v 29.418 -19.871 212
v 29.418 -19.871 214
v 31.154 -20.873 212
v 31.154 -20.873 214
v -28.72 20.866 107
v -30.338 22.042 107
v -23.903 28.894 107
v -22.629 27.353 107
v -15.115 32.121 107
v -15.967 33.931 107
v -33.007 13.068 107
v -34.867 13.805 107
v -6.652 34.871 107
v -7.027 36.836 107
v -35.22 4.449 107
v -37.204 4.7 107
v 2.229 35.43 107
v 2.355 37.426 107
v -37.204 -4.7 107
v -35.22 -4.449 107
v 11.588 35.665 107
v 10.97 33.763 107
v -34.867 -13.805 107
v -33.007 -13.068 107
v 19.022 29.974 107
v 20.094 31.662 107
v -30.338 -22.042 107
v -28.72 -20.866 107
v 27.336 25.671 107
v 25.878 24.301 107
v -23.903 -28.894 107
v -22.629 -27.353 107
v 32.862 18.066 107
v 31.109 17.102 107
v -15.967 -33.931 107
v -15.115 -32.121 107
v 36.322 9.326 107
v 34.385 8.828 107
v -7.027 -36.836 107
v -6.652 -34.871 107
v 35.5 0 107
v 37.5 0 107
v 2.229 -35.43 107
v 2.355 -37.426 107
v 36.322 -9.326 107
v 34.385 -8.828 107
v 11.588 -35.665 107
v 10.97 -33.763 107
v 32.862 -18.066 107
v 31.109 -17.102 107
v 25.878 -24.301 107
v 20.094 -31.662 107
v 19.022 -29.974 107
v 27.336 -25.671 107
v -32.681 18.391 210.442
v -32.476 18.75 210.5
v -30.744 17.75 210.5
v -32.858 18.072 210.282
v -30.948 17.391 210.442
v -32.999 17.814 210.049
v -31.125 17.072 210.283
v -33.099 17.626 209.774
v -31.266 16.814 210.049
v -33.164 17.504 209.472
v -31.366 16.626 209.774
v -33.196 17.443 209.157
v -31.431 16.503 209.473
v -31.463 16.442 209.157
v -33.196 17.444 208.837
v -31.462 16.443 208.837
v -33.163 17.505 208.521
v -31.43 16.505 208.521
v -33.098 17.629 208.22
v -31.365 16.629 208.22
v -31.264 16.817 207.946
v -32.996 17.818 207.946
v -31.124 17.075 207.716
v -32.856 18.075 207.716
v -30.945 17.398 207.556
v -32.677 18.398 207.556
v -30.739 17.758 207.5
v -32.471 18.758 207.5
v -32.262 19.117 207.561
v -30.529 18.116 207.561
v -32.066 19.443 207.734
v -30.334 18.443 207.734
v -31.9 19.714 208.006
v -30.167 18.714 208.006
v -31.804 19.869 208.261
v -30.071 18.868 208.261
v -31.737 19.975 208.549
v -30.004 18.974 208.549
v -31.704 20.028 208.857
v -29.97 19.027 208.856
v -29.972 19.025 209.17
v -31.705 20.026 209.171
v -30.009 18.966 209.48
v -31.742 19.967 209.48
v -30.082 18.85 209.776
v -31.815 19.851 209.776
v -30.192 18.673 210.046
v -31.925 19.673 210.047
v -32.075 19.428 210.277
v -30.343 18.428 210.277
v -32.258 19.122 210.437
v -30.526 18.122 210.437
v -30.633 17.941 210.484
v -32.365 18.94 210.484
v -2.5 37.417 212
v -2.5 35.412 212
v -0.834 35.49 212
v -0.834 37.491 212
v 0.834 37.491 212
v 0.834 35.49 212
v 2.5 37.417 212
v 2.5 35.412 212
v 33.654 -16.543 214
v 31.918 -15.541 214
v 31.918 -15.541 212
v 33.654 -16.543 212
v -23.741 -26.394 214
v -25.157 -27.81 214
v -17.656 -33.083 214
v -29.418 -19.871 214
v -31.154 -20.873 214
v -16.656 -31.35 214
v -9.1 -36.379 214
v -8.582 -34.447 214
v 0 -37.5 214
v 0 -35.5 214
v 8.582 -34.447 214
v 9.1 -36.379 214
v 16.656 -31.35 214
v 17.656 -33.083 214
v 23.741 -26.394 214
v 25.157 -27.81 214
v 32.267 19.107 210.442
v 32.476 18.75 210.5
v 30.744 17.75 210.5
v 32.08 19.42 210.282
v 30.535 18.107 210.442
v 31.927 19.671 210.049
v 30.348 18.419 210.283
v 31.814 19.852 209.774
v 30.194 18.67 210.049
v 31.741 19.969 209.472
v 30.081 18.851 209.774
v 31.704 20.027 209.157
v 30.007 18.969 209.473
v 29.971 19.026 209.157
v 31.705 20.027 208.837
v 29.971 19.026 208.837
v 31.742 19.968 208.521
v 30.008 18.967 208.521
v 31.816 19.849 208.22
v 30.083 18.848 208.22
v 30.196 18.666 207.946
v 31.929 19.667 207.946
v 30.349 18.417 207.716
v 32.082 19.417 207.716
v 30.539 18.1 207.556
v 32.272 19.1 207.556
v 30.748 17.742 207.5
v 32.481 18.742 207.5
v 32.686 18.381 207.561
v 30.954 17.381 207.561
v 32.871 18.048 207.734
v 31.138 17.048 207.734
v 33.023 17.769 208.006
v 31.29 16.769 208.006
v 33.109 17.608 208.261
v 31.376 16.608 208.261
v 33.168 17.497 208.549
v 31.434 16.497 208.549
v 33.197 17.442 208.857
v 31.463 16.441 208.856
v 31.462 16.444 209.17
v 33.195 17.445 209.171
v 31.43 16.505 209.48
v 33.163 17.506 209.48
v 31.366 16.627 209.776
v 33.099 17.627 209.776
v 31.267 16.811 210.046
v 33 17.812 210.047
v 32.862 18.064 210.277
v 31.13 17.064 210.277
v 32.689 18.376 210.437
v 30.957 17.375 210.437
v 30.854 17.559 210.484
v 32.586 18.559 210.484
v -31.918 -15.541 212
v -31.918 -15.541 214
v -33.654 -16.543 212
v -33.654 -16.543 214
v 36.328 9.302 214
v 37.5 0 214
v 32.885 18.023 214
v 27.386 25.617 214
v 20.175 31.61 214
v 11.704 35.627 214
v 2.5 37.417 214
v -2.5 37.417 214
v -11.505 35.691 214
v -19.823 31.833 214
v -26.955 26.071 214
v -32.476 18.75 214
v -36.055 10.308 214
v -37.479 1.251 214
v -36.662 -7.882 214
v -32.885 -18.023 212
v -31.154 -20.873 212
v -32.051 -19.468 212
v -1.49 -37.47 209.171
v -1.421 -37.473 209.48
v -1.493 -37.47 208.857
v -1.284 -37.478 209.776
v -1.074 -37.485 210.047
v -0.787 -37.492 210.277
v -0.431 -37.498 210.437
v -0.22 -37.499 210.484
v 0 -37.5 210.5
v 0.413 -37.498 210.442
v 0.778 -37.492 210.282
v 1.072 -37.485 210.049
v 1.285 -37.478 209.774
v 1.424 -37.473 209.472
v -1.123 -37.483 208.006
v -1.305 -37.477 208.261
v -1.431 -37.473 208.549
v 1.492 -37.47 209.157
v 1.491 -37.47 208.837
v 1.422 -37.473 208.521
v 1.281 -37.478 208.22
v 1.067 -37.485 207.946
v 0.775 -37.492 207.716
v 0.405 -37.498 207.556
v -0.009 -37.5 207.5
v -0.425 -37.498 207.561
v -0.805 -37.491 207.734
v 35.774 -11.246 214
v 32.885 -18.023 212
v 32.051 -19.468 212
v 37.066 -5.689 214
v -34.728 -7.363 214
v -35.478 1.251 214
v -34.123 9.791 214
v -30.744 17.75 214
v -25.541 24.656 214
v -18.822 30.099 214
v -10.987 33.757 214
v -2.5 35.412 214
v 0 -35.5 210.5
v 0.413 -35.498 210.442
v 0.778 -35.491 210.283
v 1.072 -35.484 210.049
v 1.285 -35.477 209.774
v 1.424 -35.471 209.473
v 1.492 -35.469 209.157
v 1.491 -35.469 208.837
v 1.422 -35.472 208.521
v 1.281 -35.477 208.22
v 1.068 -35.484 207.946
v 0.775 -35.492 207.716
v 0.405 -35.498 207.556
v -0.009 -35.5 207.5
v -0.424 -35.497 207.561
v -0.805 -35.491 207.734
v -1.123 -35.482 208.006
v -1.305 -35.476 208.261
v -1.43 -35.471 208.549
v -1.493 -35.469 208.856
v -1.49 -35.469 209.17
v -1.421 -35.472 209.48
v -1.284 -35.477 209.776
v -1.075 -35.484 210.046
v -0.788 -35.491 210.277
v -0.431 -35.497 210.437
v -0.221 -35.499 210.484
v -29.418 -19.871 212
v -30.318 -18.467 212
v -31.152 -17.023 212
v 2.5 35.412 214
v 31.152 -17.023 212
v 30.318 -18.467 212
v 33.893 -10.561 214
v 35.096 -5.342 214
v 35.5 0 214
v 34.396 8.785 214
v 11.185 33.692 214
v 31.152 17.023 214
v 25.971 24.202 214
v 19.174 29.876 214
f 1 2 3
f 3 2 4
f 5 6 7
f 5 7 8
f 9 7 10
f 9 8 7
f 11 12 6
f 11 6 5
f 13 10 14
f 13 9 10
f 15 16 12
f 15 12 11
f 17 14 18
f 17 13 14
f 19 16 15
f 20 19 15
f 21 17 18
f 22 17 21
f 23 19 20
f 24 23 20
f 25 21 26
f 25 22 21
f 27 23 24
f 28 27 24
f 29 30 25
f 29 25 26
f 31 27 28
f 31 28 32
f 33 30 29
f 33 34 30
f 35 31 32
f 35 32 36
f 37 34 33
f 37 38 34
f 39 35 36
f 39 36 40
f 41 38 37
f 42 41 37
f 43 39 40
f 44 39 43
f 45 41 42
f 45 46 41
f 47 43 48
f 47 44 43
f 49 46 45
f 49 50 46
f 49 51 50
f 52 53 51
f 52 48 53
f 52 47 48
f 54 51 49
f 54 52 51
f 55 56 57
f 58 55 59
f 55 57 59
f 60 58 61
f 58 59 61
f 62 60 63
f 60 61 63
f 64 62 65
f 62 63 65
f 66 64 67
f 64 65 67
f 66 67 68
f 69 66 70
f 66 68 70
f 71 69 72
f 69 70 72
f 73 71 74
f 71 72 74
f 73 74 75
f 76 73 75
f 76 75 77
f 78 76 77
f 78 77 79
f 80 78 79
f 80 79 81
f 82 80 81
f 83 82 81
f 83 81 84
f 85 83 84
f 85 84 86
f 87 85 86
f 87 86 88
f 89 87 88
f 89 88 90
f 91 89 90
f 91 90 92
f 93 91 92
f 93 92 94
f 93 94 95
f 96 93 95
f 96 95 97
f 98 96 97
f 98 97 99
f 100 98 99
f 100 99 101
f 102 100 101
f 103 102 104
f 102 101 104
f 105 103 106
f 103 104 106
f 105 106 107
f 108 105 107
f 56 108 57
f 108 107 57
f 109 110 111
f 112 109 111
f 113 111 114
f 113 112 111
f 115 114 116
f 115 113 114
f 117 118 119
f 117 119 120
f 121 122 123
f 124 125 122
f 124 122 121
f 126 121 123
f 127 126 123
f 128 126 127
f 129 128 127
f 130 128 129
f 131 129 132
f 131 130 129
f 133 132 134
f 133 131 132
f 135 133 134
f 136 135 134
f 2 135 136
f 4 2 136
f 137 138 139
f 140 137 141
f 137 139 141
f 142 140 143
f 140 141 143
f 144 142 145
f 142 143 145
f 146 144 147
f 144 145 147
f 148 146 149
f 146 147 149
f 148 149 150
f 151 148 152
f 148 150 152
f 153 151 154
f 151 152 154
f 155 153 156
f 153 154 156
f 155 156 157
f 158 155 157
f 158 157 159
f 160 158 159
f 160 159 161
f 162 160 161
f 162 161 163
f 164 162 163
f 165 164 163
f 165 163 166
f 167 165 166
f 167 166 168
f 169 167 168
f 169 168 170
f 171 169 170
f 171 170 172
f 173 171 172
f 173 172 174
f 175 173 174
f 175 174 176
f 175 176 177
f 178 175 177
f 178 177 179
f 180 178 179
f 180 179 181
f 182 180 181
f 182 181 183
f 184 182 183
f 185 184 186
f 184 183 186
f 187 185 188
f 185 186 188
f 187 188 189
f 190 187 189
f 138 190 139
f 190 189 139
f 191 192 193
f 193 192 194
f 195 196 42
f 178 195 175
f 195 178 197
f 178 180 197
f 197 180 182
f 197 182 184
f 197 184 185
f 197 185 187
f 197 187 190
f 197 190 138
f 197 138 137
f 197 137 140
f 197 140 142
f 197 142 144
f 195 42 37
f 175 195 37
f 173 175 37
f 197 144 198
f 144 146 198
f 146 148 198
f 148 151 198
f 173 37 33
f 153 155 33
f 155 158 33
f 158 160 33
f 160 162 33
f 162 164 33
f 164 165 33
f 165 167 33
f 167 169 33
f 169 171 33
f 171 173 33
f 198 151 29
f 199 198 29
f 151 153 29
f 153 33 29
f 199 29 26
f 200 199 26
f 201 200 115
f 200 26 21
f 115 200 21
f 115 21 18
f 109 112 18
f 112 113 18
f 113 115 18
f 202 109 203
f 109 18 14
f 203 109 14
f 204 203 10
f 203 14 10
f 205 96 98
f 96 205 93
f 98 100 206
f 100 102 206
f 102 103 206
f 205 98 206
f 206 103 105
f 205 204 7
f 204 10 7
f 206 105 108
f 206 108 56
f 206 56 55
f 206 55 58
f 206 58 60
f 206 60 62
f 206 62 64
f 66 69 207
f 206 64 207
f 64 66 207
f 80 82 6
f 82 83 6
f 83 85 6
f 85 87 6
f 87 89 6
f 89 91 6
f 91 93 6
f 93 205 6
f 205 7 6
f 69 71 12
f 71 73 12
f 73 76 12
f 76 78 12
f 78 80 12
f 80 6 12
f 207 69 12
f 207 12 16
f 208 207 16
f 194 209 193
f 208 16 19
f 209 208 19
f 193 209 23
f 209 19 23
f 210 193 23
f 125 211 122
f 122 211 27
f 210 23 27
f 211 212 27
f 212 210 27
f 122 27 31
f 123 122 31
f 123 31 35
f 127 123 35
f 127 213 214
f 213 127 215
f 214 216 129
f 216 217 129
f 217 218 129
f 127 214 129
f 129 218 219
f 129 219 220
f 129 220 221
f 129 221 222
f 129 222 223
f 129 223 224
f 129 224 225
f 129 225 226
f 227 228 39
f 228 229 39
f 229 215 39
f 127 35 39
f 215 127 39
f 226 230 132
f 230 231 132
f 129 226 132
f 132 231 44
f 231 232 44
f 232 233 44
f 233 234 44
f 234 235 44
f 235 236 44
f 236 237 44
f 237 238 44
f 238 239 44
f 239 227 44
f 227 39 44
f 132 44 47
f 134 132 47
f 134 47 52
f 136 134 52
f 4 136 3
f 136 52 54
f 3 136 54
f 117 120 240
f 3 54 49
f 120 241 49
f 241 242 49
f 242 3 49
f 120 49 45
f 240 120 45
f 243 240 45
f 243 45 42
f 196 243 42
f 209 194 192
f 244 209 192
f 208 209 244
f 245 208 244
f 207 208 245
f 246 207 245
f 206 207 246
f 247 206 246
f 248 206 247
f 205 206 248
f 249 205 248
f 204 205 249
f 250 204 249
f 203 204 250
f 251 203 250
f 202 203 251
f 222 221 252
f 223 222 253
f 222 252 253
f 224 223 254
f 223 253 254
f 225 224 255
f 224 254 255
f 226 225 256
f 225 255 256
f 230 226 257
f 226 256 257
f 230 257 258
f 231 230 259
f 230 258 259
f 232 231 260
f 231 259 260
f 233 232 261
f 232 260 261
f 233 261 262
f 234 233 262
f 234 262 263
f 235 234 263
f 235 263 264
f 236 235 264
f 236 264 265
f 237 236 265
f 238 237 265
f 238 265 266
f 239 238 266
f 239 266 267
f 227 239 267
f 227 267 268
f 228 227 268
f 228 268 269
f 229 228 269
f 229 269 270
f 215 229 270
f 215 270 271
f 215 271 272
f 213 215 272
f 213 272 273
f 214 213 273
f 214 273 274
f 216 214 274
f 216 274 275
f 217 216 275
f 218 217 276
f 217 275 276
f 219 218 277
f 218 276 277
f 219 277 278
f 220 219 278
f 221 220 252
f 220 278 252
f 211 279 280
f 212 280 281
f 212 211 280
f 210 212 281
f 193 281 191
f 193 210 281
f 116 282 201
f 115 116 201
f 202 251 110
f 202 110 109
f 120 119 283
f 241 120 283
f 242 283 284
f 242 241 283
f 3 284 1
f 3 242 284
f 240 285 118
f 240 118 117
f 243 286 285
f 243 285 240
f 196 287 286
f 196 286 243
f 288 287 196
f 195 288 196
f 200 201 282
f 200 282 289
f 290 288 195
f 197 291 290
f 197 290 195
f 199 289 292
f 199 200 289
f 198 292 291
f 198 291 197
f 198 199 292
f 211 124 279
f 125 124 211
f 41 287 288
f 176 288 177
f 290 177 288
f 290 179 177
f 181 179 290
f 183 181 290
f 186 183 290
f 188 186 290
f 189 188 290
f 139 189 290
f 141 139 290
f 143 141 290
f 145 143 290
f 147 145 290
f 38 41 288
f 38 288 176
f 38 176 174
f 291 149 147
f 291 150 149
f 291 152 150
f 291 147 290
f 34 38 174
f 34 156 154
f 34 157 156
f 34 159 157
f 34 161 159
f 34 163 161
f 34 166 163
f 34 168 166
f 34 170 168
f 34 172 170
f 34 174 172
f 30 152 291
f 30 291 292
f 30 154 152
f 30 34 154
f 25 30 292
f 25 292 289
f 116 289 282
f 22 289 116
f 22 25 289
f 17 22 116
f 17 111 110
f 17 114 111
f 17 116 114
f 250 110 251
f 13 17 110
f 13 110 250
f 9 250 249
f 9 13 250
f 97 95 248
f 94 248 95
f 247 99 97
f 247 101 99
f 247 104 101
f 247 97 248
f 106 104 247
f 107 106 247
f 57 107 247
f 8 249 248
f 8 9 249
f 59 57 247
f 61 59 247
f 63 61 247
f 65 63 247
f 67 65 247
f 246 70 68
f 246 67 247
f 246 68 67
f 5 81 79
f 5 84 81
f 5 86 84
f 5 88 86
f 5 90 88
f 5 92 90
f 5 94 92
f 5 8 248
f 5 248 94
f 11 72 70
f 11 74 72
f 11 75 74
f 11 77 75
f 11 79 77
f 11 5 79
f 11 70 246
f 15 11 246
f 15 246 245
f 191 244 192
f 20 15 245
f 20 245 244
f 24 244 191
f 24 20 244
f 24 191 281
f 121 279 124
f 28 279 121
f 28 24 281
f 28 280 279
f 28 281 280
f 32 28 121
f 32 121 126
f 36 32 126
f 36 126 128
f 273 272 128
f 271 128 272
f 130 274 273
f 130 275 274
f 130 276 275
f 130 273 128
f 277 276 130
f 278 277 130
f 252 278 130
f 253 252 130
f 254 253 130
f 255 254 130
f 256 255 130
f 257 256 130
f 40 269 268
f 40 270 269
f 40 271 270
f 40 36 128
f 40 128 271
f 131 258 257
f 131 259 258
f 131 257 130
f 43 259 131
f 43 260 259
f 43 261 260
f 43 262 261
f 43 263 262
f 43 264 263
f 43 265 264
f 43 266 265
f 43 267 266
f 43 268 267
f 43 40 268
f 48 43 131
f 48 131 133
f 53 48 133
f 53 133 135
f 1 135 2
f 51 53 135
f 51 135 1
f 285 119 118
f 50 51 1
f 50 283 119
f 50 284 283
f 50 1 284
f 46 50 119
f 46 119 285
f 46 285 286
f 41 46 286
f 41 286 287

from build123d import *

# Parameters (mm, degrees)
SKETCH_1_R               = 37.5
SKETCH_1_R_2             = 35.5
EXTRUDE_1_DEPTH          = 214
SKETCH_2_R               = 1.5
CUT_EXTRUDE_1_DEPTH      = 88
PATTERN_CIRCULAR_1_COUNT = 3
SKETCH_3_W               = 5
SKETCH_3_H               = 20.375275098
CUT_EXTRUDE_2_DEPTH      = 2
PATTERN_CIRCULAR_2_COUNT = 3
SKETCH_4_W               = 5
SKETCH_4_H               = 20.375275098
CUT_EXTRUDE_3_DEPTH      = 2
PATTERN_CIRCULAR_3_COUNT = 3
CUT_EXTRUDE_4_DEPTH      = 156
CUT_EXTRUDE_4_DEPTH_BACK = 165
SKETCH_5_W               = 164.762813688
SKETCH_5_H               = 214


with BuildPart() as part:
    # Эскиз1 → Бобышка-Вытянуть1 (new body)
    with BuildSketch(Plane.XY):
        Circle(SKETCH_1_R)
        Circle(SKETCH_1_R_2, mode=Mode.SUBTRACT)
    extrude(amount=EXTRUDE_1_DEPTH)

    # Эскиз2 → Вырез-Вытянуть1 (cut)
    with BuildSketch(Plane(origin=(0, 0, 0), x_dir=(1, 0, 0), z_dir=(0, 1, 0))):
        with Locations(Location((0, -5, 0), (0, 0, 270))):
            Circle(SKETCH_2_R)
        with Locations(Location((0, -209, 0), (0, 0, 270))):
            Circle(SKETCH_2_R)
    cut_extrude_1 = extrude(amount=-CUT_EXTRUDE_1_DEPTH, mode=Mode.SUBTRACT)

    # Круговой массив1: Вырез-Вытянуть1 ×3 about axis
    pattern_circular_1_axis = Axis((0, 0, 214), (0, 0, -1))
    for i in range(1, PATTERN_CIRCULAR_1_COUNT):
        add(cut_extrude_1.rotate(pattern_circular_1_axis, i * 360 / PATTERN_CIRCULAR_1_COUNT), mode=Mode.SUBTRACT)

    # Эскиз3 → Вырез-Вытянуть2 (cut)
    with BuildSketch(Plane(origin=(0, 0, 0), x_dir=(-1, 0, 0), z_dir=(0, 0, -1))):
        with Locations((0, 27.321603857)):
            Rectangle(SKETCH_3_W, SKETCH_3_H)
    cut_extrude_2 = extrude(amount=-CUT_EXTRUDE_2_DEPTH, mode=Mode.SUBTRACT)

    # Круговой массив2: Вырез-Вытянуть2 ×3 about axis
    pattern_circular_2_axis = Axis((0, 0, 0), (0, 0, 1))
    for i in range(1, PATTERN_CIRCULAR_2_COUNT):
        add(cut_extrude_2.rotate(pattern_circular_2_axis, i * 360 / PATTERN_CIRCULAR_2_COUNT), mode=Mode.SUBTRACT)

    # Эскиз4 → Вырез-Вытянуть3 (cut)
    with BuildSketch(Plane.XY.offset(214)):
        with Locations((0, 27.321603857)):
            Rectangle(SKETCH_4_W, SKETCH_4_H)
    cut_extrude_3 = extrude(amount=-CUT_EXTRUDE_3_DEPTH, mode=Mode.SUBTRACT)

    # Круговой массив3: Вырез-Вытянуть3 ×3 about axis
    pattern_circular_3_axis = Axis((0, 0, 0), (0, 0, 1))
    for i in range(1, PATTERN_CIRCULAR_3_COUNT):
        add(cut_extrude_3.rotate(pattern_circular_3_axis, i * 360 / PATTERN_CIRCULAR_3_COUNT), mode=Mode.SUBTRACT)

    # Эскиз5 → Вырез-Вытянуть4 (cut, two sides: drawn at the far end of the back side and taken through both)
    with BuildSketch(Plane(origin=(0, 0, 0), x_dir=(1, 0, 0), z_dir=(0, 1, 0)).offset(-CUT_EXTRUDE_4_DEPTH_BACK)):
        Rectangle(SKETCH_5_W, SKETCH_5_H)
    extrude(amount=CUT_EXTRUDE_4_DEPTH + CUT_EXTRUDE_4_DEPTH_BACK, mode=Mode.SUBTRACT)


solid = part.part
